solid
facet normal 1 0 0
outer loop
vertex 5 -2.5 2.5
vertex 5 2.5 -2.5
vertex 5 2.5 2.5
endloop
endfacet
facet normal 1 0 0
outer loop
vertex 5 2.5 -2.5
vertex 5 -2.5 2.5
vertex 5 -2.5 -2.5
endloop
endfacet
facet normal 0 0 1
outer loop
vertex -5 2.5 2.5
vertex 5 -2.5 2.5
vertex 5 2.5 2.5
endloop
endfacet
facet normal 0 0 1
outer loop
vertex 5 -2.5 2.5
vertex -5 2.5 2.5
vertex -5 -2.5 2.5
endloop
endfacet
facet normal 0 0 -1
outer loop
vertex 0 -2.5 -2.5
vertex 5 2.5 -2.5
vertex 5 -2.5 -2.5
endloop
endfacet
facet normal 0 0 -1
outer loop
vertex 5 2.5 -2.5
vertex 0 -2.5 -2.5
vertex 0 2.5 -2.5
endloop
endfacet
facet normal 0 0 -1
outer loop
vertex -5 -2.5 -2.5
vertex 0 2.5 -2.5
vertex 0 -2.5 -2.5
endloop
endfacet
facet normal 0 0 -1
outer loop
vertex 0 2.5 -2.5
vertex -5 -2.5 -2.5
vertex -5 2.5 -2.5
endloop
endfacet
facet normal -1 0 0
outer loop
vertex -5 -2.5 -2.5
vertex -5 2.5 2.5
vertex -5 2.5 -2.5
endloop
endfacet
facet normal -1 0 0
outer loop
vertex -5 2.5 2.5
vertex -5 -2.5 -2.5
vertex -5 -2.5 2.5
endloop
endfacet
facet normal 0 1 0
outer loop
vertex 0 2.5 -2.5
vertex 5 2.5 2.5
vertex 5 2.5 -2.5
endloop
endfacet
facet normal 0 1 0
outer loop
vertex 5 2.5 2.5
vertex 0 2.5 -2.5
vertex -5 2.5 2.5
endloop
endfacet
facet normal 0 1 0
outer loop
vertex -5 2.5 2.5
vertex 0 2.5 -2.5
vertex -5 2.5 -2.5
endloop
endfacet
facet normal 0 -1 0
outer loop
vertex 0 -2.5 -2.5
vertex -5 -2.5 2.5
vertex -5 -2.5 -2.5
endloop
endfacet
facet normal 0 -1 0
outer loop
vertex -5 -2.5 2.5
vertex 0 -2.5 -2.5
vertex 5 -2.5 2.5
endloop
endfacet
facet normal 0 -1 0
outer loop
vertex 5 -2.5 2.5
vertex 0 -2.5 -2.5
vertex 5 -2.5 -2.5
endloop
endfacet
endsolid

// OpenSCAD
$fn = 100;
difference() {
    cube([10, 5, 5], center=true);
    rotate([90,0,0]) translate([0,-5,0]) cylinder(10,2.5,2.5, center=true);
}
